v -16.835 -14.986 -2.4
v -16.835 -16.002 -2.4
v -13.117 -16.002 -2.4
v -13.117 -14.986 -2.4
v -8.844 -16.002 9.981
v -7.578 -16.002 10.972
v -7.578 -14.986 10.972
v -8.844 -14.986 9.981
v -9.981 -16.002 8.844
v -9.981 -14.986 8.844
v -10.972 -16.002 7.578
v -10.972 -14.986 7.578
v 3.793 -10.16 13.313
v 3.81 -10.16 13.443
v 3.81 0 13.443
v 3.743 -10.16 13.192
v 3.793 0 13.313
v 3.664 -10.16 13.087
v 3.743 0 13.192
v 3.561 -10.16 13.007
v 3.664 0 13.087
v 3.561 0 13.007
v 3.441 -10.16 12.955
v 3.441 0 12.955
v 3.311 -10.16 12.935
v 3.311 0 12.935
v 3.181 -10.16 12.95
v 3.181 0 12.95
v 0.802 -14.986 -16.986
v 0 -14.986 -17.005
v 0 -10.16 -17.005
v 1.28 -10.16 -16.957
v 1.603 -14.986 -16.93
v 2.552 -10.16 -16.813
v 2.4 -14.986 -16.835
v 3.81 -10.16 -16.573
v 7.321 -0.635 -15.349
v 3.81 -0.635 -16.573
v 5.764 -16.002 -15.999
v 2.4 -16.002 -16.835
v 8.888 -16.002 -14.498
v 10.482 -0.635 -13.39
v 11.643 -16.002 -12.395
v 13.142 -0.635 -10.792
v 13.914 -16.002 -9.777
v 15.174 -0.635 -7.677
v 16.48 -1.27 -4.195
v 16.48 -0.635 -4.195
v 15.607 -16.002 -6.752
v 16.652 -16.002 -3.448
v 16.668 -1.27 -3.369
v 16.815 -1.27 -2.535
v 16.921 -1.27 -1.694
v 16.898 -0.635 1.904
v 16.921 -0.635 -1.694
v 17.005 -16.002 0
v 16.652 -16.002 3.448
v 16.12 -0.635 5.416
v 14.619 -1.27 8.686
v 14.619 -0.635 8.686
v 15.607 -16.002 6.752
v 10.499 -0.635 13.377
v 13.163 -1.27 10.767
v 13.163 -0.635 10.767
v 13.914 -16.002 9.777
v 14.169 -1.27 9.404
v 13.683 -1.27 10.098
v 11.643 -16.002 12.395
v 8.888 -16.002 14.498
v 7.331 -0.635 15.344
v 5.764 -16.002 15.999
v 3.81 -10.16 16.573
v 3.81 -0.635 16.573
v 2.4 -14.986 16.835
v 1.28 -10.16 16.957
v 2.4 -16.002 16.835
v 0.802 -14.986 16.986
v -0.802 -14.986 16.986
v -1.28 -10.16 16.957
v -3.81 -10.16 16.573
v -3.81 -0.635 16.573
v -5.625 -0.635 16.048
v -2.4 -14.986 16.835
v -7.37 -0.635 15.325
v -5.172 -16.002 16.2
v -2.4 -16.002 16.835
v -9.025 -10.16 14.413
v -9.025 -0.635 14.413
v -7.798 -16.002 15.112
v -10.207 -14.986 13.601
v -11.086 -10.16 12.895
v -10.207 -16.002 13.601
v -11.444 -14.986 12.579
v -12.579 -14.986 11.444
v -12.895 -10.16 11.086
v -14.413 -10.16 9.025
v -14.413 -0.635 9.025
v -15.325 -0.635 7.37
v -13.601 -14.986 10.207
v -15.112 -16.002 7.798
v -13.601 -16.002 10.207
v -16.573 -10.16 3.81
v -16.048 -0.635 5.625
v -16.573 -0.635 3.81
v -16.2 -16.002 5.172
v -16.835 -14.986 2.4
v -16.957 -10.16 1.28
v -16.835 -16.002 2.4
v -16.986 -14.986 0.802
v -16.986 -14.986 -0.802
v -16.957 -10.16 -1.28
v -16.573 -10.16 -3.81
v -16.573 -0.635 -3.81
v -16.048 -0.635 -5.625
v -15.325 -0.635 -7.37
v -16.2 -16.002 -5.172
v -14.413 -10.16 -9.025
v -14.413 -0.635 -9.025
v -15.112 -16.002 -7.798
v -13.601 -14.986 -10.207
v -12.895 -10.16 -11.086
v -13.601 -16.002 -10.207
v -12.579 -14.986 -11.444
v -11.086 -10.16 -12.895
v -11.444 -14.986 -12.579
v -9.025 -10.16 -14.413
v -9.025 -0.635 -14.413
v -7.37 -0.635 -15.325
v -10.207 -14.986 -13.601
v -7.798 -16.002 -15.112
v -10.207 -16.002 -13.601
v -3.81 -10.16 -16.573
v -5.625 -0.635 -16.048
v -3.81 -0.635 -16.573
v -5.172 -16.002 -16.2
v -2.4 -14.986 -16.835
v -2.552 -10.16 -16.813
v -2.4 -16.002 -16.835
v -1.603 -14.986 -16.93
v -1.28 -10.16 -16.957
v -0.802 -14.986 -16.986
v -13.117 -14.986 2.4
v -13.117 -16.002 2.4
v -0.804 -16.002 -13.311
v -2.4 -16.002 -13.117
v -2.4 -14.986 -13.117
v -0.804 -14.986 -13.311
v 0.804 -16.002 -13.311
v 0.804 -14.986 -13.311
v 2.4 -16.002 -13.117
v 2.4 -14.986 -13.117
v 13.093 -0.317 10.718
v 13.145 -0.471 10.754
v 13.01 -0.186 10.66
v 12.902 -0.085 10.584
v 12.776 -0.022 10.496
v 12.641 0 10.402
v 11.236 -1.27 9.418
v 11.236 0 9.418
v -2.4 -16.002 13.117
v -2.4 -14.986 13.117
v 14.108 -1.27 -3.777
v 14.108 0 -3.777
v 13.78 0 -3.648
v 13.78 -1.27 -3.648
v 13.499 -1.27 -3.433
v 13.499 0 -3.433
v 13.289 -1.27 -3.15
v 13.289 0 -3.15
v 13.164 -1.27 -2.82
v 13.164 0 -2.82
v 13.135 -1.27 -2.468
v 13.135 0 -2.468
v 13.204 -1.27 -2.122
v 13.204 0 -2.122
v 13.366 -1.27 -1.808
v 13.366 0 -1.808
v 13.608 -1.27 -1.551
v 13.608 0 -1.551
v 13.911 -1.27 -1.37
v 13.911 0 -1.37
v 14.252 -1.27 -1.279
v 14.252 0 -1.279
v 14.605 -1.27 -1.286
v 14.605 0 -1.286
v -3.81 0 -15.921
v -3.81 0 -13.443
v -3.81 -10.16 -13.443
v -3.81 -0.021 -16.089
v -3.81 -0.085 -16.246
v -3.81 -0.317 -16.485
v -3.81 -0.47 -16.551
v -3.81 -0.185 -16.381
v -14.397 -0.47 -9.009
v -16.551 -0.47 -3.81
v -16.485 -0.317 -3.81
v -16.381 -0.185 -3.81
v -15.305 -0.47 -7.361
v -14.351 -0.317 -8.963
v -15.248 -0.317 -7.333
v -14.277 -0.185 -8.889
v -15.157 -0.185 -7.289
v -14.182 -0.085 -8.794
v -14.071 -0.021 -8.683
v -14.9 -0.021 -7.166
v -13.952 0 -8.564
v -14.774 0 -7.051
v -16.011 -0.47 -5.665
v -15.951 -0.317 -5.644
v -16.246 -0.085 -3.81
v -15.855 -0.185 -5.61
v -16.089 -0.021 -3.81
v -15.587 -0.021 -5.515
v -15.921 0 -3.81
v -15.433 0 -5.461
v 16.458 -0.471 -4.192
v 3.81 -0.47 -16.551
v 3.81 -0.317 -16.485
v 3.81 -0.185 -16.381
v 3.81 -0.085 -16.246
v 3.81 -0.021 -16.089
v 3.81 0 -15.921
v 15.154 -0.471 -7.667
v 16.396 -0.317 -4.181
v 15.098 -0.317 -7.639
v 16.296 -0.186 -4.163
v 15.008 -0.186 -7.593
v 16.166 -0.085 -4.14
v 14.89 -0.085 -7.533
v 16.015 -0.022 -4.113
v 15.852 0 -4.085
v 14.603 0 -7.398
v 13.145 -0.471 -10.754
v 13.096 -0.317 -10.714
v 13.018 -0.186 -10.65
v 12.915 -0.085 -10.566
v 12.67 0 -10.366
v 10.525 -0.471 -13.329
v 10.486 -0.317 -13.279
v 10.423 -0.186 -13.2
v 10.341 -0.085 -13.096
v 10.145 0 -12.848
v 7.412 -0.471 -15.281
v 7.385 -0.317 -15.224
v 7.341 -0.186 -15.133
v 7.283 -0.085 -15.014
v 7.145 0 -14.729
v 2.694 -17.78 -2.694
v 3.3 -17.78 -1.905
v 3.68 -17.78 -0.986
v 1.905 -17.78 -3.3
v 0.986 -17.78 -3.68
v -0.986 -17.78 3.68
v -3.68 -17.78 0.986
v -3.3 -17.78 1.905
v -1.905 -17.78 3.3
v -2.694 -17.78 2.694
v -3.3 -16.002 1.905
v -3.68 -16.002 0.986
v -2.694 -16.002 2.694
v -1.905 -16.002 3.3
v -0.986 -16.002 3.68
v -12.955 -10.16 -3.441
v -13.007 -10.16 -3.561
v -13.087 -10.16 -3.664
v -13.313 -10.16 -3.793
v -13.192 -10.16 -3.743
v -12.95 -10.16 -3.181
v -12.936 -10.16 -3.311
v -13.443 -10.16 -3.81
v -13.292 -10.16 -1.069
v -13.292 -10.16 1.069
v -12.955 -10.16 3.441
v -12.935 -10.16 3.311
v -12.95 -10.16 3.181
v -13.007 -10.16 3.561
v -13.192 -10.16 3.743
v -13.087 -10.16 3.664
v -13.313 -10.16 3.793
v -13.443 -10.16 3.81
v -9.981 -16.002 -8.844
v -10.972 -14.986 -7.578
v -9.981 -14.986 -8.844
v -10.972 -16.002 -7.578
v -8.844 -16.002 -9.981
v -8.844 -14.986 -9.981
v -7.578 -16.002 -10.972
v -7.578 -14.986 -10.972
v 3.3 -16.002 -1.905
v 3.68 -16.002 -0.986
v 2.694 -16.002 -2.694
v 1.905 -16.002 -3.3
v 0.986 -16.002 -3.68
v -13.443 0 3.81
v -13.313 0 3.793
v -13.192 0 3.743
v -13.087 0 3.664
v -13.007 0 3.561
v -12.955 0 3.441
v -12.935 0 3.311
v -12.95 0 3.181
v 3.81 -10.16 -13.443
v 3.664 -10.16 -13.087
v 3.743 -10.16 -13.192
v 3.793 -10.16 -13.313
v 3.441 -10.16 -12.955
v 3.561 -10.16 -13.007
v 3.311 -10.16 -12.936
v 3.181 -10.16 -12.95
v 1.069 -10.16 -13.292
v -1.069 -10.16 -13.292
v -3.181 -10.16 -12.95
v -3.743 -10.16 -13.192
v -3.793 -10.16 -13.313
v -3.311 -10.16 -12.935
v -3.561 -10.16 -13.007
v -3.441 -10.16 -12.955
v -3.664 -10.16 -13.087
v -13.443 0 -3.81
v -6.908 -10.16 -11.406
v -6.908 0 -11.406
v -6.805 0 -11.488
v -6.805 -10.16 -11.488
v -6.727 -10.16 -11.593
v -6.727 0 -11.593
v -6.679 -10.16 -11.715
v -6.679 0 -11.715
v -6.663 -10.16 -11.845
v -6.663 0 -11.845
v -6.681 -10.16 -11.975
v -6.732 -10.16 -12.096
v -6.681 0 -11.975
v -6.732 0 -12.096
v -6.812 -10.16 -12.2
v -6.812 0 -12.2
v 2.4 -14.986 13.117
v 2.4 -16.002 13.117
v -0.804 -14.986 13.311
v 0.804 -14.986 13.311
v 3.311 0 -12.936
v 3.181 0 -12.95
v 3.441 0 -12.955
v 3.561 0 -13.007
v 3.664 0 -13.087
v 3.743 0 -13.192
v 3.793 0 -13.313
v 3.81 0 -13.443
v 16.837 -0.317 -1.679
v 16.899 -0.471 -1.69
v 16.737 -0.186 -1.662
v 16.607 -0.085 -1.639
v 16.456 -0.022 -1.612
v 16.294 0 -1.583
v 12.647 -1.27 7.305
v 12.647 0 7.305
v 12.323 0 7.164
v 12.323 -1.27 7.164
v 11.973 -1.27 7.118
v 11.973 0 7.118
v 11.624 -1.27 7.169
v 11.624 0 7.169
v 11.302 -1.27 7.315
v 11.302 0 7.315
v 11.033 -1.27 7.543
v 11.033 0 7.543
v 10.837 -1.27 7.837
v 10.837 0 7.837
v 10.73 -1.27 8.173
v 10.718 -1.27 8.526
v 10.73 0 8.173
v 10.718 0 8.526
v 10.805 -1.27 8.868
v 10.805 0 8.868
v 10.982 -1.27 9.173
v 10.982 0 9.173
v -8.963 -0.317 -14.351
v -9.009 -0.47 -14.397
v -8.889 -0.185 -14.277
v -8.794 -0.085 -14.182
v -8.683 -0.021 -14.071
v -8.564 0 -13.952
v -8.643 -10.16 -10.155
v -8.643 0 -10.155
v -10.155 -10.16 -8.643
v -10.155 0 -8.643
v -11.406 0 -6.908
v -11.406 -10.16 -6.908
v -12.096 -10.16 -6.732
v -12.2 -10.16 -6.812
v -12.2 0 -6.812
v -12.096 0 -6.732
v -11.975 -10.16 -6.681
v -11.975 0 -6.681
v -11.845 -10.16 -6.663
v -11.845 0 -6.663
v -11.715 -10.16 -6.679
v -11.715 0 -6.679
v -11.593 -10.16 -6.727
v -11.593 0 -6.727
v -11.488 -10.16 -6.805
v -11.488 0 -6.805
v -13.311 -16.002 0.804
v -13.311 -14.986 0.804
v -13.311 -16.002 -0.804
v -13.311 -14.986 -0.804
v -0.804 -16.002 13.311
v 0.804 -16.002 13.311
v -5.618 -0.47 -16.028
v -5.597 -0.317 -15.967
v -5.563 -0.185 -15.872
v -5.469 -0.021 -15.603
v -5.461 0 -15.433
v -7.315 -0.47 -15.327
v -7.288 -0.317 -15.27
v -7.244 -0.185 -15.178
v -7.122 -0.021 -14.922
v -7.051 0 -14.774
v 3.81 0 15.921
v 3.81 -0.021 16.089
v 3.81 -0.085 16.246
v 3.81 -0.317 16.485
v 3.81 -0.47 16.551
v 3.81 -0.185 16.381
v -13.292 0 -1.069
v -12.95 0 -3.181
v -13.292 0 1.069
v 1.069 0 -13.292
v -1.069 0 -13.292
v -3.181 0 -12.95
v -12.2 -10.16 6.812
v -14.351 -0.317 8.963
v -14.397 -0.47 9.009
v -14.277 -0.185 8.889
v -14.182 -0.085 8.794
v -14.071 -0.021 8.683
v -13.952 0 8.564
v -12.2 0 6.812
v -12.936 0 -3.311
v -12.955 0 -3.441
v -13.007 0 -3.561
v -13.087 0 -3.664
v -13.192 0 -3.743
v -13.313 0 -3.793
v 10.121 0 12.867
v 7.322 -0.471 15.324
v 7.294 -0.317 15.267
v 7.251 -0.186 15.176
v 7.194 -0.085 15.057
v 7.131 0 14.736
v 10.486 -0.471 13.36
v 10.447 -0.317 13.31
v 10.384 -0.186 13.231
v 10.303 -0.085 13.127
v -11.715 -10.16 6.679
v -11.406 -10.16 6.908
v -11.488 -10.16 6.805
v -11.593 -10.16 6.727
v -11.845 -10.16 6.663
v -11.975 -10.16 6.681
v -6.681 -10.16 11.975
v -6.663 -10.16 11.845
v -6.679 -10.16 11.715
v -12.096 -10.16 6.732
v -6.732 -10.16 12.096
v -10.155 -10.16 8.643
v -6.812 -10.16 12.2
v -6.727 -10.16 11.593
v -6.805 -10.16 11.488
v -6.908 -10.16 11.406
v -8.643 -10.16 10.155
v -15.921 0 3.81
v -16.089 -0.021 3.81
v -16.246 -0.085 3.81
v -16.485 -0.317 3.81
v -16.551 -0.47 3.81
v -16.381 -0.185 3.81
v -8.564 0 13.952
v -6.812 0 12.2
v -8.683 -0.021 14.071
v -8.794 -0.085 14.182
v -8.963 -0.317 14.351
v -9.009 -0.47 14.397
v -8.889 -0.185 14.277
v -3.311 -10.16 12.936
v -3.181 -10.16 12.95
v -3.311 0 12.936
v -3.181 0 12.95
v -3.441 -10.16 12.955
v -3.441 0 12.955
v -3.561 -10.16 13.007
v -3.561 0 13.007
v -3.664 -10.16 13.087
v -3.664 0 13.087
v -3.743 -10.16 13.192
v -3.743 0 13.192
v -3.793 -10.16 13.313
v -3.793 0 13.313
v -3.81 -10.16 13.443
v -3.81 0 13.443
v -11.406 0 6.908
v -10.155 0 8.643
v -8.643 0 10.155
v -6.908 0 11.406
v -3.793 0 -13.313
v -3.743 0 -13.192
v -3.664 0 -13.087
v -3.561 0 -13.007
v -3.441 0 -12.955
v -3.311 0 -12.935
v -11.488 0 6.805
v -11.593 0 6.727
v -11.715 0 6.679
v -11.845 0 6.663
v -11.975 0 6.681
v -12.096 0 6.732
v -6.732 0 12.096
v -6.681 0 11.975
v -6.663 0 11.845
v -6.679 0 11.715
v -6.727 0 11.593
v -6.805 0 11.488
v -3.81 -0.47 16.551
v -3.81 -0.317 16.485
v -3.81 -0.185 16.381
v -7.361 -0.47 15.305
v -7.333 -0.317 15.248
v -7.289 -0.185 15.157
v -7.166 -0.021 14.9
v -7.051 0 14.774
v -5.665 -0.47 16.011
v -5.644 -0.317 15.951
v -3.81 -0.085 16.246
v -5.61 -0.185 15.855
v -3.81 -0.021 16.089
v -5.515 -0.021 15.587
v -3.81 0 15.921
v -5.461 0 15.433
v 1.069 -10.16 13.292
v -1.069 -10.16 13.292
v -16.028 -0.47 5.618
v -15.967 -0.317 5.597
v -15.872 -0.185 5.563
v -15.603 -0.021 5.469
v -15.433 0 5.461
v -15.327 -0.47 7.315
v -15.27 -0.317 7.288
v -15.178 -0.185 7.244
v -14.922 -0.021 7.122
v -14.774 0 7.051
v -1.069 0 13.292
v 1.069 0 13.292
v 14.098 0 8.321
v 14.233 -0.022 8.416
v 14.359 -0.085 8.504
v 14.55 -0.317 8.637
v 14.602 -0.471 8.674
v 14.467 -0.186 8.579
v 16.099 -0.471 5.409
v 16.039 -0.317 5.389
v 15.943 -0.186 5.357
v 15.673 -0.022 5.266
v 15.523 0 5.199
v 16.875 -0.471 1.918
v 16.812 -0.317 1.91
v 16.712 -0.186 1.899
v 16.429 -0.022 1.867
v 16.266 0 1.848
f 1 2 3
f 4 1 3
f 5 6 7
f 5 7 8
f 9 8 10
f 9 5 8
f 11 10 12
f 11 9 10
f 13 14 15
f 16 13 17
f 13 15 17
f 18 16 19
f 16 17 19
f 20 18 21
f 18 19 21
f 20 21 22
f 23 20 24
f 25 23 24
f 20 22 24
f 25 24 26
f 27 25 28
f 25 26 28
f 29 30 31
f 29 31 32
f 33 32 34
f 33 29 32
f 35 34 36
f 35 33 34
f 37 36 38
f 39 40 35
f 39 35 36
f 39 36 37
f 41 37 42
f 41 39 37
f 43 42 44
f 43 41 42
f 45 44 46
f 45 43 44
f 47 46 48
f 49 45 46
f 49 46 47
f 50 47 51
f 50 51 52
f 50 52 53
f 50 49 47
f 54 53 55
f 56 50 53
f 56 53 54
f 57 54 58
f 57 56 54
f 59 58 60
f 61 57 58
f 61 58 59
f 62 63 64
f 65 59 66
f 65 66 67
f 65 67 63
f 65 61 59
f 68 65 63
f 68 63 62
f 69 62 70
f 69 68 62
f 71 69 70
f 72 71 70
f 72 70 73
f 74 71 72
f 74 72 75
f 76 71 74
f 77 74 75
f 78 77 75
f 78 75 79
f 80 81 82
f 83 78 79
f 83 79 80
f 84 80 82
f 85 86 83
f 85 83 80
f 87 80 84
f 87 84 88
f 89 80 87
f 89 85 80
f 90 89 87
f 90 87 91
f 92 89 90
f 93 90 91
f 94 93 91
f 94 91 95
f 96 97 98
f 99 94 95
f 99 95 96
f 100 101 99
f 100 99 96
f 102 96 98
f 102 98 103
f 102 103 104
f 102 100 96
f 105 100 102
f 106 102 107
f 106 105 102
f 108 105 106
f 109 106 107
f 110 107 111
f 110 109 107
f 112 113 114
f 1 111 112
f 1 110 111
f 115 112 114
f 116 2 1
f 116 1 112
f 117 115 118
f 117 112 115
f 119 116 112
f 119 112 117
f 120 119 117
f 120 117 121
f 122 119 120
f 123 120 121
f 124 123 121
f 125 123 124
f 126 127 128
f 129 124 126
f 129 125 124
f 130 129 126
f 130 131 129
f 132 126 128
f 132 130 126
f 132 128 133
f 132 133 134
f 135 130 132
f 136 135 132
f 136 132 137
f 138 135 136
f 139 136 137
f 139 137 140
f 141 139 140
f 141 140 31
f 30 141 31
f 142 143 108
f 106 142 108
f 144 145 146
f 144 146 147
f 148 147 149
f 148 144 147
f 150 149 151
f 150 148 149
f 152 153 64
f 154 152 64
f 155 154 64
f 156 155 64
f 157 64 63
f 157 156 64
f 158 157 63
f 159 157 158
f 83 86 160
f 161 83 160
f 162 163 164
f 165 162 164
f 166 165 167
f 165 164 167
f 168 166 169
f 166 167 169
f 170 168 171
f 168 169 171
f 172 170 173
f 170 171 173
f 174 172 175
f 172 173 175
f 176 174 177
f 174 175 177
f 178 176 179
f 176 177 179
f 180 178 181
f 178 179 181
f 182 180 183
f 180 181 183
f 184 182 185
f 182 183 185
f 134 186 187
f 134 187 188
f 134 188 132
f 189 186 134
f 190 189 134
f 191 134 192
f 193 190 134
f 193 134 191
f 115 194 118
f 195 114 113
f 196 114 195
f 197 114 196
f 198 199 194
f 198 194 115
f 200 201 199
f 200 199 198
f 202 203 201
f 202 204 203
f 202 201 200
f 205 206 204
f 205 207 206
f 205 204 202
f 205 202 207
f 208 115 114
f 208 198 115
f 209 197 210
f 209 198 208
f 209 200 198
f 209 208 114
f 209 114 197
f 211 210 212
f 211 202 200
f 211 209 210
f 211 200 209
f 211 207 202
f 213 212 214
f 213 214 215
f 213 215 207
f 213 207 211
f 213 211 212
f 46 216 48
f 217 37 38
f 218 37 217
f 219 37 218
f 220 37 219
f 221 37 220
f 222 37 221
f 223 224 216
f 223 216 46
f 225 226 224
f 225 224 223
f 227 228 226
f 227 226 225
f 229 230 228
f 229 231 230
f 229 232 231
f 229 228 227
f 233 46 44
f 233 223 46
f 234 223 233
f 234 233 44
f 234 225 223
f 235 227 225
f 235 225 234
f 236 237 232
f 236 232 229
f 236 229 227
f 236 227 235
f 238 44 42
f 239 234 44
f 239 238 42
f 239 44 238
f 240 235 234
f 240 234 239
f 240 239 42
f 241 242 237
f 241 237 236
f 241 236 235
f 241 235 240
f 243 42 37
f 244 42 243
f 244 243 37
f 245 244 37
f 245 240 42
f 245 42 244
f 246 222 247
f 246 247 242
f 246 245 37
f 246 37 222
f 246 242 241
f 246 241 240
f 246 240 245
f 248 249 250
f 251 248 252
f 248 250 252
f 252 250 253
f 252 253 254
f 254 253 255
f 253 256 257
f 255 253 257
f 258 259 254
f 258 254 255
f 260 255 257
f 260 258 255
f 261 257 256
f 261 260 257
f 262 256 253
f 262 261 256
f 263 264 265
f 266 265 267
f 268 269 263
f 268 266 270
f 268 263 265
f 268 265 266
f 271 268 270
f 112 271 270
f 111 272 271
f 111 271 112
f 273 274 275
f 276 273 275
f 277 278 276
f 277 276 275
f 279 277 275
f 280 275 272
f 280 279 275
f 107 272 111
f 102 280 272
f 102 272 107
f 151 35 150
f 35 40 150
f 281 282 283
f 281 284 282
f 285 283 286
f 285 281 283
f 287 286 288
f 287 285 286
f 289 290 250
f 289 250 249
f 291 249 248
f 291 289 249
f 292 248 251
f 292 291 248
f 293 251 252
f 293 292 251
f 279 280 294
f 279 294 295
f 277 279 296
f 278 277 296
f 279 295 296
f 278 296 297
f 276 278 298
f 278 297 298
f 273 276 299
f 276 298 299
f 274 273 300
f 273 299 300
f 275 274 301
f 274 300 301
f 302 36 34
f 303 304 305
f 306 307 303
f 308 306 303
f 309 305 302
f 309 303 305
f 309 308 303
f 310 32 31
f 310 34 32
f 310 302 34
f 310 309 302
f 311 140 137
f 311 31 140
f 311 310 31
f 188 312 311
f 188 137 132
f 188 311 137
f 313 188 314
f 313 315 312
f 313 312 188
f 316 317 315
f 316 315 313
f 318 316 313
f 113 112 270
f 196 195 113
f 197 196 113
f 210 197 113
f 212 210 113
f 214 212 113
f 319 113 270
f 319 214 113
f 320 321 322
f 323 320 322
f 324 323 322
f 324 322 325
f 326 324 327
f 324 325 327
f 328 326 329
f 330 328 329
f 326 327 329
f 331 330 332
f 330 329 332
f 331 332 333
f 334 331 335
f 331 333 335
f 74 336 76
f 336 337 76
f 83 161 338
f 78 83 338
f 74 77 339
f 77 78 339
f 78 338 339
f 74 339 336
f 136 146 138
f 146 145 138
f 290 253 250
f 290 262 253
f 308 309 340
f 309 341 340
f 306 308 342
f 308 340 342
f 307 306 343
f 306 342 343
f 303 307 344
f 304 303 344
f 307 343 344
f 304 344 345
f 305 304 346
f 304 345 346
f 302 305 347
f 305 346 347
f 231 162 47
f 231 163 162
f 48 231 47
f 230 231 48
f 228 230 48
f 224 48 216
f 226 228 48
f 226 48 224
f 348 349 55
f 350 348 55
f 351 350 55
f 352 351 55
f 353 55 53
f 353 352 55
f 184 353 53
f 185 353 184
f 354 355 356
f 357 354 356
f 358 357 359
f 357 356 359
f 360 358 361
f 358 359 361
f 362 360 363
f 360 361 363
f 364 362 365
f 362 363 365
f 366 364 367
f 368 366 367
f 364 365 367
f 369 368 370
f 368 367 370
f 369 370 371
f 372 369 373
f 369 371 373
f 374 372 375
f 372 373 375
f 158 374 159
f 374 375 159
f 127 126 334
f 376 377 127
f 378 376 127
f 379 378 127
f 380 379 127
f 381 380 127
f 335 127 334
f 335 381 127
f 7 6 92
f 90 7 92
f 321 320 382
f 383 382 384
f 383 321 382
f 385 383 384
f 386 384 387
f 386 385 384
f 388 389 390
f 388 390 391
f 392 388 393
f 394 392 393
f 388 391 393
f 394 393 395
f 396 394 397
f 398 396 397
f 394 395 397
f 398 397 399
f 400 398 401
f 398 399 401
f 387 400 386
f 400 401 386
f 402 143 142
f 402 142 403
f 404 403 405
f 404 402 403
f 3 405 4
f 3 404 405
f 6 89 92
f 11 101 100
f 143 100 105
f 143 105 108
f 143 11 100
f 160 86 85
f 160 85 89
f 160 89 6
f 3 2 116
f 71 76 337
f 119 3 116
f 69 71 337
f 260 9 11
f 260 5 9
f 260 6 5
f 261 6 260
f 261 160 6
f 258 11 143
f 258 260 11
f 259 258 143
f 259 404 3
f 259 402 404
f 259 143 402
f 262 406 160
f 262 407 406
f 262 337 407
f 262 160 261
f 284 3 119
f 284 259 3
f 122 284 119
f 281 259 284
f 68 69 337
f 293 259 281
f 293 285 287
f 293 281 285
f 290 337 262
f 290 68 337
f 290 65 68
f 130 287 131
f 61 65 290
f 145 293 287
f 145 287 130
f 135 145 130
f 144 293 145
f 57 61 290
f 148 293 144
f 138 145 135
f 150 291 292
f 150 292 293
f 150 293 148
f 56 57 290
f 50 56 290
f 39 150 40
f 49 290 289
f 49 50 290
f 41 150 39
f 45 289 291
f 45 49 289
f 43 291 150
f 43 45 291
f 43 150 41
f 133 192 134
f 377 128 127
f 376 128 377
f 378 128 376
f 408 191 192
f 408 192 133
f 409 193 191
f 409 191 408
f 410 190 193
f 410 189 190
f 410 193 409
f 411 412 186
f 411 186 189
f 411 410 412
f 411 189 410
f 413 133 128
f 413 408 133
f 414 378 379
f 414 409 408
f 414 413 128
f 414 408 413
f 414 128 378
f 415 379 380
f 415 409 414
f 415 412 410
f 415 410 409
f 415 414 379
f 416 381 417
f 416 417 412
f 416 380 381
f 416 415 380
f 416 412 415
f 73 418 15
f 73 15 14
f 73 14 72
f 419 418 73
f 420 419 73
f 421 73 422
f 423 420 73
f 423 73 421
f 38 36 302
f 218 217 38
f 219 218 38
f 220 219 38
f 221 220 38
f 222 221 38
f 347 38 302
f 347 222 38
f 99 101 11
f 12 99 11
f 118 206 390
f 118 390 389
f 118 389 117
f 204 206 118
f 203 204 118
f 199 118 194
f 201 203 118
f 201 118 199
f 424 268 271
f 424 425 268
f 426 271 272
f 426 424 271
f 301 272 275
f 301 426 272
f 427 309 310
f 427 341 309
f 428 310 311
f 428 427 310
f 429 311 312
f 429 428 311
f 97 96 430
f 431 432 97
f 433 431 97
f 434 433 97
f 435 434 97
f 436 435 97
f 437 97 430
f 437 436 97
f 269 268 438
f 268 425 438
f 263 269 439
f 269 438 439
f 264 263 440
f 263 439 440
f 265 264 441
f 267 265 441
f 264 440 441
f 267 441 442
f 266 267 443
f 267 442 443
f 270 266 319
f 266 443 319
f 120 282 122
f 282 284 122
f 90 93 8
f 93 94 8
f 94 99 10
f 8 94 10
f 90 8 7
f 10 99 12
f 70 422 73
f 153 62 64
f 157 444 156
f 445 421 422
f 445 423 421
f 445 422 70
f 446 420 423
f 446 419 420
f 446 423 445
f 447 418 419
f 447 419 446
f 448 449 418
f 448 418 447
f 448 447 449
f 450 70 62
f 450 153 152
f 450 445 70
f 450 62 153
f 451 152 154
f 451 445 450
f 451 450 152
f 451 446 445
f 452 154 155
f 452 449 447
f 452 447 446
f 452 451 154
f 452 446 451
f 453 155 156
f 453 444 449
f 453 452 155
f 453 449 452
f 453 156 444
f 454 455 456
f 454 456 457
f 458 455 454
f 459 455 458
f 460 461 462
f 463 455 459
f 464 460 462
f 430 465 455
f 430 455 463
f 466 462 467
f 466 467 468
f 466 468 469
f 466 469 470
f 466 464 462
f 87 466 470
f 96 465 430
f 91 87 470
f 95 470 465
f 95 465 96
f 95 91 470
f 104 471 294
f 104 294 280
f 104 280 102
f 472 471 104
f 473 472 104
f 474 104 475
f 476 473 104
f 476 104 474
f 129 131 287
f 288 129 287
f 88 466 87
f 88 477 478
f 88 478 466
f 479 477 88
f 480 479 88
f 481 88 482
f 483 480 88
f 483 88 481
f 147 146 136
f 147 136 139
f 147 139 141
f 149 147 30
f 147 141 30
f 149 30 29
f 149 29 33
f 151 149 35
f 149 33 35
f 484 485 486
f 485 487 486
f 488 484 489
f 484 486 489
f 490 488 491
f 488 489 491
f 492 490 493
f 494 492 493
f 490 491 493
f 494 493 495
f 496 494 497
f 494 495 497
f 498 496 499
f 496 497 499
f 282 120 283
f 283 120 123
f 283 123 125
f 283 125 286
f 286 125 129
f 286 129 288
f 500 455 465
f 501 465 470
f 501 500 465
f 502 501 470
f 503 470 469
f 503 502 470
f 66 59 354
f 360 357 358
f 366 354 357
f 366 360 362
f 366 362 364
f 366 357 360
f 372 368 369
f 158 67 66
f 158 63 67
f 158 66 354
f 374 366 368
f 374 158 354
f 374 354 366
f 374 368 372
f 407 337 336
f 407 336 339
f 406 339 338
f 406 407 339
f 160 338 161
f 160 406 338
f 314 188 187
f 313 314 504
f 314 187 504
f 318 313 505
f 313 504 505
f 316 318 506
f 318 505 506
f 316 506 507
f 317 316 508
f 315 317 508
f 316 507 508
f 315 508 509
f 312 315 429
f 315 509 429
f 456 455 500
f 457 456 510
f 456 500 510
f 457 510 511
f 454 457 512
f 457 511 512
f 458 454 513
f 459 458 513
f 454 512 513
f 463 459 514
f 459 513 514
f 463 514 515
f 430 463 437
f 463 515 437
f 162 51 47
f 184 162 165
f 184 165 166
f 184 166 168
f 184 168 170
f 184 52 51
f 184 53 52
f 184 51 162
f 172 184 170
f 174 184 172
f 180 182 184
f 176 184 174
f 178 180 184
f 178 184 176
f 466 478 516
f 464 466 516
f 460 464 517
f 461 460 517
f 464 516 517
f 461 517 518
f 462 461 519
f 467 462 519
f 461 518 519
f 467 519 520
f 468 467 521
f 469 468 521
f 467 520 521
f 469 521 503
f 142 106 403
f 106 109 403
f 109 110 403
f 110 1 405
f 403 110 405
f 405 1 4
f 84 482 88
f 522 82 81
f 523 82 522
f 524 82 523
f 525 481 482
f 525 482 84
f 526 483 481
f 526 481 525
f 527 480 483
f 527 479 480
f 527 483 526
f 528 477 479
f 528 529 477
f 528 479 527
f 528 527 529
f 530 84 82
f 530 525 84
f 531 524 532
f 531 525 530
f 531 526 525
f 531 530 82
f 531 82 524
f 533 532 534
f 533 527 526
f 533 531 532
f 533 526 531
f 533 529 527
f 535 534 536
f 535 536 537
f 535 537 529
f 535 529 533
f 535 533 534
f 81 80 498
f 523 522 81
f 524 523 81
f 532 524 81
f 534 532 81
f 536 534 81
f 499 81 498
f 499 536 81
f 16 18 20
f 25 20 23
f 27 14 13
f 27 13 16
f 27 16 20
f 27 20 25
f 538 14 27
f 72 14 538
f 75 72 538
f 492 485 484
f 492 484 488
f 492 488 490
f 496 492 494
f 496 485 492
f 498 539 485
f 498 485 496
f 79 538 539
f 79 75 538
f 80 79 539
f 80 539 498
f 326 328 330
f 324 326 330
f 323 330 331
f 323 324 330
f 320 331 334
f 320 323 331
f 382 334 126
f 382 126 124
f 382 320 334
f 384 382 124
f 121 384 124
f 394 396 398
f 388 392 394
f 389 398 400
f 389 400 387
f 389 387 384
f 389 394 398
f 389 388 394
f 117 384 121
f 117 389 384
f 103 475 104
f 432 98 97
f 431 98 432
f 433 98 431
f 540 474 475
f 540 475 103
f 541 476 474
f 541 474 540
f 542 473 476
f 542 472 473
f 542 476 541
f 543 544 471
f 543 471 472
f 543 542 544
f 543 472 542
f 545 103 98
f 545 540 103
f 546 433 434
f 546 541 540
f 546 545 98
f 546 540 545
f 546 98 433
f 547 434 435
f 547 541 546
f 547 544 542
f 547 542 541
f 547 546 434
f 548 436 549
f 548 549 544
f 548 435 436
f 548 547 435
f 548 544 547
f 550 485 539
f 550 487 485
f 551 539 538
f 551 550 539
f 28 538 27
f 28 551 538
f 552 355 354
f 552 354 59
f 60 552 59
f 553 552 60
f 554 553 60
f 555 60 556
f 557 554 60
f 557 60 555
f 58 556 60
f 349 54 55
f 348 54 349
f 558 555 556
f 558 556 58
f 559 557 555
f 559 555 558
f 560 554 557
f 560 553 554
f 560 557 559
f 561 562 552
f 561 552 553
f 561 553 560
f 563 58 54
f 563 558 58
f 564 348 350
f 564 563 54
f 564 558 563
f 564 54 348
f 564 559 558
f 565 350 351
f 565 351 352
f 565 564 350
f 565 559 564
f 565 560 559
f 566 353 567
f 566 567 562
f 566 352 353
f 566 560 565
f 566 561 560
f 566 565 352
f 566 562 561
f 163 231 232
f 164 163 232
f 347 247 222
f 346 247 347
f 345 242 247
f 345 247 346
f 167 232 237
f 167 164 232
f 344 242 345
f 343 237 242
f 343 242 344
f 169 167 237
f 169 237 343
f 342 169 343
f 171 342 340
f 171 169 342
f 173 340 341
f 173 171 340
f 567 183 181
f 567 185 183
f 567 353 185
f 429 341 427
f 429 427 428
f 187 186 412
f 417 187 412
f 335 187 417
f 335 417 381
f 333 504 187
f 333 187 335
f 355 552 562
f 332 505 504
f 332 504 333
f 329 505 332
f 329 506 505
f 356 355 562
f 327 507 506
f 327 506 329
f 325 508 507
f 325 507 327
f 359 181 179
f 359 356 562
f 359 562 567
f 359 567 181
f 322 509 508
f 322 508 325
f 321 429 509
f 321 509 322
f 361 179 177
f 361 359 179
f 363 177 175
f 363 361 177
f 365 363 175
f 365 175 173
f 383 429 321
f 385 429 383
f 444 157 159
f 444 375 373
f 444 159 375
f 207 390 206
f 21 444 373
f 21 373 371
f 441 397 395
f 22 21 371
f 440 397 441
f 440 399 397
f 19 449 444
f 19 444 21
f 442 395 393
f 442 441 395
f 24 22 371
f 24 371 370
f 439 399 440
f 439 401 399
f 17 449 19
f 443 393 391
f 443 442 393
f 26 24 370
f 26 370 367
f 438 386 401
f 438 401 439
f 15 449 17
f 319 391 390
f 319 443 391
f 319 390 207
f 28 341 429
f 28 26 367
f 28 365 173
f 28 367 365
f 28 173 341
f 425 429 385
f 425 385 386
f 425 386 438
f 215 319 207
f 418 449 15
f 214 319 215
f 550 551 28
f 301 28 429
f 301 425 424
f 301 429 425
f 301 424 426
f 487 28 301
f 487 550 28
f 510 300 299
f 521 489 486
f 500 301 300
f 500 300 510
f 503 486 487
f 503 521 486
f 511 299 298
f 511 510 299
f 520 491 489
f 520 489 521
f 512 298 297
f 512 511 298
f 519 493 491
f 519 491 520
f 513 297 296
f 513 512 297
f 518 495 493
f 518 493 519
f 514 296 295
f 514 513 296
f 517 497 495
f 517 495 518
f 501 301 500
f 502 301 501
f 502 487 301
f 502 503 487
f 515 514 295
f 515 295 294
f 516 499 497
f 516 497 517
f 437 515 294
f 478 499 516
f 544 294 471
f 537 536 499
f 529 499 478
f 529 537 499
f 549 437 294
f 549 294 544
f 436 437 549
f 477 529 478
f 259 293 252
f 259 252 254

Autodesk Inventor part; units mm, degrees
sketch "Sketch_1" plane through (0, 0, 0) normal (1, 0, 0) x (0, 1, 0)
  line L0 (-16.002, 0) -> (0, 0)
  line L1 (0, 0) -> (0, -16.3703)
  arc A0 (-0.635, -17.0053) -> (0, -16.3703) centre (-0.635, -16.3703) ccw
  line L2 (-0.635, -17.0053) -> (-16.002, -17.0053)
  line L3 (-16.002, -17.0053) -> (-16.002, 0)
  line L4 (-16.002, 0) -> (0, 0)
revolve "Revolution1" add sketch "Sketch_1" angle 360 about axis through (0, -16.002, 0) along (0, -1, 0)
sketch "Sketch_2" plane through (0, 0, 0) normal (0, 1, 0) x (-1, 0, 0)
  circle A0 centre (0, 0) radius 21.59
  line L0 (17.78, -3.81) -> (13.4434, -3.81)
  arc A1 (12.9501, -3.1808) -> (13.4434, -3.81) centre (13.4434, -3.302) ccw
  arc A2 (12.9501, -3.1808) -> (12.9501, 3.1808) centre (0, 0) ccw
  arc A3 (13.4434, 3.81) -> (12.9501, 3.1808) centre (13.4434, 3.302) ccw
  line L1 (13.4434, 3.81) -> (17.78, 3.81)
  arc A4 (17.78, 3.81) -> (15.2664, 9.8783) centre (0, 0) ccw
  line L2 (15.2664, 9.8783) -> (12.2, 6.8119)
  arc A5 (11.4063, 6.9079) -> (12.2, 6.8119) centre (11.8408, 7.1711) ccw
  arc A6 (11.4063, 6.9079) -> (6.9079, 11.4063) centre (0, 0) ccw
  arc A7 (6.8119, 12.2) -> (6.9079, 11.4063) centre (7.1711, 11.8408) ccw
  line L3 (6.8119, 12.2) -> (9.8783, 15.2664)
  arc A8 (9.8783, 15.2664) -> (3.81, 17.78) centre (0, 0) ccw
  line L4 (3.81, 17.78) -> (3.81, 13.4434)
  arc A9 (3.1808, 12.9501) -> (3.81, 13.4434) centre (3.302, 13.4434) ccw
  arc A10 (3.1808, 12.9501) -> (-3.1808, 12.9501) centre (0, 0) ccw
  arc A11 (-3.81, 13.4434) -> (-3.1808, 12.9501) centre (-3.302, 13.4434) ccw
  line L5 (-3.81, 13.4434) -> (-3.81, 17.78)
  arc A12 (-3.81, 17.78) -> (-3.81, -17.78) centre (0, 0) ccw
  line L6 (-3.81, -17.78) -> (-3.81, -13.4434)
  arc A13 (-3.1808, -12.9501) -> (-3.81, -13.4434) centre (-3.302, -13.4434) ccw
  arc A14 (-3.1808, -12.9501) -> (3.1808, -12.9501) centre (0, 0) ccw
  arc A15 (3.81, -13.4434) -> (3.1808, -12.9501) centre (3.302, -13.4434) ccw
  line L7 (3.81, -13.4434) -> (3.81, -17.78)
  arc A16 (3.81, -17.78) -> (9.8783, -15.2664) centre (0, 0) ccw
  line L8 (9.8783, -15.2664) -> (6.8119, -12.2)
  arc A17 (6.9079, -11.4063) -> (6.8119, -12.2) centre (7.1711, -11.8408) ccw
  arc A18 (6.9079, -11.4063) -> (11.4063, -6.9079) centre (0, 0) ccw
  arc A19 (12.2, -6.8119) -> (11.4063, -6.9079) centre (11.8408, -7.1711) ccw
  line L9 (12.2, -6.8119) -> (15.2664, -9.8783)
  arc A20 (15.2664, -9.8783) -> (17.78, -3.81) centre (0, 0) ccw
extrude "Extrusion1" cut sketch "Sketch_2" against normal blind 10.16
sketch "Sketch_3" plane through (0, 0, 0) normal (0, 1, 0) x (-1, 0, 0)
  circle A0 centre (0, 0) radius 20.4599
  arc A1 (-17.2893, -4.3382) -> (-13.8361, 11.2385) centre (0, 0) ccw
  line L0 (-13.8361, 11.2385) -> (-11.2363, 9.4181)
  arc A2 (-12.6468, 7.305) -> (-11.2363, 9.4181) centre (-11.9823, 8.3888) ccw
  line L1 (-12.6468, 7.305) -> (-15.293, 9.1579)
  arc A3 (-15.293, 9.1579) -> (-17.7304, -1.8368) centre (0, 0) ccw
  line L2 (-17.7304, -1.8368) -> (-14.6049, -1.2856)
  arc A4 (-14.1081, -3.7772) -> (-14.6049, -1.2856) centre (-14.4046, -2.541) ccw
  line L3 (-14.1081, -3.7772) -> (-17.2893, -4.3382)
extrude "Extrusion2" cut sketch "Sketch_3" against normal blind 1.27
sketch "Sketch_4" plane through (0, -16.002, 0) normal (0, 1, 0) x (1, 0, 0)
  circle A0 centre (0, 0) radius 21.59
  line L0 (-17.78, 2.4003) -> (-13.1172, 2.4003)
  arc A1 (-13.1172, 2.4003) -> (-13.1172, -2.4003) centre (0, 0) ccw
  line L1 (-13.1172, -2.4003) -> (-17.78, -2.4003)
  arc A2 (-17.78, -2.4003) -> (-14.2696, -10.8751) centre (0, 0) ccw
  line L2 (-14.2696, -10.8751) -> (-10.9725, -7.578)
  arc A3 (-10.9725, -7.578) -> (-7.578, -10.9725) centre (0, 0) ccw
  line L3 (-7.578, -10.9725) -> (-10.8751, -14.2696)
  arc A4 (-10.8751, -14.2696) -> (-2.4003, -17.78) centre (0, 0) ccw
  line L4 (-2.4003, -17.78) -> (-2.4003, -13.1172)
  arc A5 (-2.4003, -13.1172) -> (2.4003, -13.1172) centre (0, 0) ccw
  line L5 (2.4003, -13.1172) -> (2.4003, -17.78)
  arc A6 (2.4003, -17.78) -> (2.4003, 17.78) centre (0, 0) ccw
  line L6 (2.4003, 17.78) -> (2.4003, 13.1172)
  arc A7 (2.4003, 13.1172) -> (-2.4003, 13.1172) centre (0, 0) ccw
  line L7 (-2.4003, 13.1172) -> (-2.4003, 17.78)
  arc A8 (-2.4003, 17.78) -> (-10.8751, 14.2696) centre (0, 0) ccw
  line L8 (-10.8751, 14.2696) -> (-7.578, 10.9725)
  arc A9 (-7.578, 10.9725) -> (-10.9725, 7.578) centre (0, 0) ccw
  line L9 (-10.9725, 7.578) -> (-14.2696, 10.8751)
  arc A10 (-14.2696, 10.8751) -> (-17.78, 2.4003) centre (0, 0) ccw
extrude "Extrusion3" cut sketch "Sketch_4" along normal blind 1.016
sketch "Sketch_8" plane through (0, 0, 0) normal (0, 1, 0) x (-1, 0, 0)
  arc A0 (3.6802, 0.9861) -> (0.9861, 3.6802) centre (0, 0) ccw
  line L0 (0.9861, 3.6802) -> (-3.6802, -0.9861)
  arc A1 (-3.6802, -0.9861) -> (-0.9861, -3.6802) centre (0, 0) ccw
  line L1 (-0.9861, -3.6802) -> (3.6802, 0.9861)
extrude "Extrusion4" add sketch "Sketch_8" against normal blind 17.78
ref_plane "to_dummy_XY" through (0, 0, 0) normal (0, -1, 0) x (1, 0, 0)
ref_plane "to_dummy_YZ" through (0, 0, 0) normal (1, 0, 0) x (0, 0, 1)
ref_plane "to_dummy_ZX" through (0, 0, 0) normal (0, 0, 1) x (0, -1, 0)
ref_plane "to_shaft_XY" through (0, 0, 0) normal (0, -1, 0) x (1, 0, 0)
ref_plane "to_shaft_YZ" through (0, 0, 0) normal (1, 0, 0) x (0, 0, 1)
ref_plane "to_shaft_ZX" through (0, 0, 0) normal (0, 0, 1) x (0, -1, 0)
ref_plane "to_trmnls_XY" through (0, -14.986, 0) normal (0, 1, 0) x (1, 0, 0)
ref_plane "to_trmnls_YZ" through (0, -14.986, 0) normal (1, 0, 0) x (0, 0, -1)
ref_plane "to_trmnls_ZX" through (0, -14.986, 0) normal (0, 0, -1) x (0, 1, 0)
properties part number "HS13Z-body"
